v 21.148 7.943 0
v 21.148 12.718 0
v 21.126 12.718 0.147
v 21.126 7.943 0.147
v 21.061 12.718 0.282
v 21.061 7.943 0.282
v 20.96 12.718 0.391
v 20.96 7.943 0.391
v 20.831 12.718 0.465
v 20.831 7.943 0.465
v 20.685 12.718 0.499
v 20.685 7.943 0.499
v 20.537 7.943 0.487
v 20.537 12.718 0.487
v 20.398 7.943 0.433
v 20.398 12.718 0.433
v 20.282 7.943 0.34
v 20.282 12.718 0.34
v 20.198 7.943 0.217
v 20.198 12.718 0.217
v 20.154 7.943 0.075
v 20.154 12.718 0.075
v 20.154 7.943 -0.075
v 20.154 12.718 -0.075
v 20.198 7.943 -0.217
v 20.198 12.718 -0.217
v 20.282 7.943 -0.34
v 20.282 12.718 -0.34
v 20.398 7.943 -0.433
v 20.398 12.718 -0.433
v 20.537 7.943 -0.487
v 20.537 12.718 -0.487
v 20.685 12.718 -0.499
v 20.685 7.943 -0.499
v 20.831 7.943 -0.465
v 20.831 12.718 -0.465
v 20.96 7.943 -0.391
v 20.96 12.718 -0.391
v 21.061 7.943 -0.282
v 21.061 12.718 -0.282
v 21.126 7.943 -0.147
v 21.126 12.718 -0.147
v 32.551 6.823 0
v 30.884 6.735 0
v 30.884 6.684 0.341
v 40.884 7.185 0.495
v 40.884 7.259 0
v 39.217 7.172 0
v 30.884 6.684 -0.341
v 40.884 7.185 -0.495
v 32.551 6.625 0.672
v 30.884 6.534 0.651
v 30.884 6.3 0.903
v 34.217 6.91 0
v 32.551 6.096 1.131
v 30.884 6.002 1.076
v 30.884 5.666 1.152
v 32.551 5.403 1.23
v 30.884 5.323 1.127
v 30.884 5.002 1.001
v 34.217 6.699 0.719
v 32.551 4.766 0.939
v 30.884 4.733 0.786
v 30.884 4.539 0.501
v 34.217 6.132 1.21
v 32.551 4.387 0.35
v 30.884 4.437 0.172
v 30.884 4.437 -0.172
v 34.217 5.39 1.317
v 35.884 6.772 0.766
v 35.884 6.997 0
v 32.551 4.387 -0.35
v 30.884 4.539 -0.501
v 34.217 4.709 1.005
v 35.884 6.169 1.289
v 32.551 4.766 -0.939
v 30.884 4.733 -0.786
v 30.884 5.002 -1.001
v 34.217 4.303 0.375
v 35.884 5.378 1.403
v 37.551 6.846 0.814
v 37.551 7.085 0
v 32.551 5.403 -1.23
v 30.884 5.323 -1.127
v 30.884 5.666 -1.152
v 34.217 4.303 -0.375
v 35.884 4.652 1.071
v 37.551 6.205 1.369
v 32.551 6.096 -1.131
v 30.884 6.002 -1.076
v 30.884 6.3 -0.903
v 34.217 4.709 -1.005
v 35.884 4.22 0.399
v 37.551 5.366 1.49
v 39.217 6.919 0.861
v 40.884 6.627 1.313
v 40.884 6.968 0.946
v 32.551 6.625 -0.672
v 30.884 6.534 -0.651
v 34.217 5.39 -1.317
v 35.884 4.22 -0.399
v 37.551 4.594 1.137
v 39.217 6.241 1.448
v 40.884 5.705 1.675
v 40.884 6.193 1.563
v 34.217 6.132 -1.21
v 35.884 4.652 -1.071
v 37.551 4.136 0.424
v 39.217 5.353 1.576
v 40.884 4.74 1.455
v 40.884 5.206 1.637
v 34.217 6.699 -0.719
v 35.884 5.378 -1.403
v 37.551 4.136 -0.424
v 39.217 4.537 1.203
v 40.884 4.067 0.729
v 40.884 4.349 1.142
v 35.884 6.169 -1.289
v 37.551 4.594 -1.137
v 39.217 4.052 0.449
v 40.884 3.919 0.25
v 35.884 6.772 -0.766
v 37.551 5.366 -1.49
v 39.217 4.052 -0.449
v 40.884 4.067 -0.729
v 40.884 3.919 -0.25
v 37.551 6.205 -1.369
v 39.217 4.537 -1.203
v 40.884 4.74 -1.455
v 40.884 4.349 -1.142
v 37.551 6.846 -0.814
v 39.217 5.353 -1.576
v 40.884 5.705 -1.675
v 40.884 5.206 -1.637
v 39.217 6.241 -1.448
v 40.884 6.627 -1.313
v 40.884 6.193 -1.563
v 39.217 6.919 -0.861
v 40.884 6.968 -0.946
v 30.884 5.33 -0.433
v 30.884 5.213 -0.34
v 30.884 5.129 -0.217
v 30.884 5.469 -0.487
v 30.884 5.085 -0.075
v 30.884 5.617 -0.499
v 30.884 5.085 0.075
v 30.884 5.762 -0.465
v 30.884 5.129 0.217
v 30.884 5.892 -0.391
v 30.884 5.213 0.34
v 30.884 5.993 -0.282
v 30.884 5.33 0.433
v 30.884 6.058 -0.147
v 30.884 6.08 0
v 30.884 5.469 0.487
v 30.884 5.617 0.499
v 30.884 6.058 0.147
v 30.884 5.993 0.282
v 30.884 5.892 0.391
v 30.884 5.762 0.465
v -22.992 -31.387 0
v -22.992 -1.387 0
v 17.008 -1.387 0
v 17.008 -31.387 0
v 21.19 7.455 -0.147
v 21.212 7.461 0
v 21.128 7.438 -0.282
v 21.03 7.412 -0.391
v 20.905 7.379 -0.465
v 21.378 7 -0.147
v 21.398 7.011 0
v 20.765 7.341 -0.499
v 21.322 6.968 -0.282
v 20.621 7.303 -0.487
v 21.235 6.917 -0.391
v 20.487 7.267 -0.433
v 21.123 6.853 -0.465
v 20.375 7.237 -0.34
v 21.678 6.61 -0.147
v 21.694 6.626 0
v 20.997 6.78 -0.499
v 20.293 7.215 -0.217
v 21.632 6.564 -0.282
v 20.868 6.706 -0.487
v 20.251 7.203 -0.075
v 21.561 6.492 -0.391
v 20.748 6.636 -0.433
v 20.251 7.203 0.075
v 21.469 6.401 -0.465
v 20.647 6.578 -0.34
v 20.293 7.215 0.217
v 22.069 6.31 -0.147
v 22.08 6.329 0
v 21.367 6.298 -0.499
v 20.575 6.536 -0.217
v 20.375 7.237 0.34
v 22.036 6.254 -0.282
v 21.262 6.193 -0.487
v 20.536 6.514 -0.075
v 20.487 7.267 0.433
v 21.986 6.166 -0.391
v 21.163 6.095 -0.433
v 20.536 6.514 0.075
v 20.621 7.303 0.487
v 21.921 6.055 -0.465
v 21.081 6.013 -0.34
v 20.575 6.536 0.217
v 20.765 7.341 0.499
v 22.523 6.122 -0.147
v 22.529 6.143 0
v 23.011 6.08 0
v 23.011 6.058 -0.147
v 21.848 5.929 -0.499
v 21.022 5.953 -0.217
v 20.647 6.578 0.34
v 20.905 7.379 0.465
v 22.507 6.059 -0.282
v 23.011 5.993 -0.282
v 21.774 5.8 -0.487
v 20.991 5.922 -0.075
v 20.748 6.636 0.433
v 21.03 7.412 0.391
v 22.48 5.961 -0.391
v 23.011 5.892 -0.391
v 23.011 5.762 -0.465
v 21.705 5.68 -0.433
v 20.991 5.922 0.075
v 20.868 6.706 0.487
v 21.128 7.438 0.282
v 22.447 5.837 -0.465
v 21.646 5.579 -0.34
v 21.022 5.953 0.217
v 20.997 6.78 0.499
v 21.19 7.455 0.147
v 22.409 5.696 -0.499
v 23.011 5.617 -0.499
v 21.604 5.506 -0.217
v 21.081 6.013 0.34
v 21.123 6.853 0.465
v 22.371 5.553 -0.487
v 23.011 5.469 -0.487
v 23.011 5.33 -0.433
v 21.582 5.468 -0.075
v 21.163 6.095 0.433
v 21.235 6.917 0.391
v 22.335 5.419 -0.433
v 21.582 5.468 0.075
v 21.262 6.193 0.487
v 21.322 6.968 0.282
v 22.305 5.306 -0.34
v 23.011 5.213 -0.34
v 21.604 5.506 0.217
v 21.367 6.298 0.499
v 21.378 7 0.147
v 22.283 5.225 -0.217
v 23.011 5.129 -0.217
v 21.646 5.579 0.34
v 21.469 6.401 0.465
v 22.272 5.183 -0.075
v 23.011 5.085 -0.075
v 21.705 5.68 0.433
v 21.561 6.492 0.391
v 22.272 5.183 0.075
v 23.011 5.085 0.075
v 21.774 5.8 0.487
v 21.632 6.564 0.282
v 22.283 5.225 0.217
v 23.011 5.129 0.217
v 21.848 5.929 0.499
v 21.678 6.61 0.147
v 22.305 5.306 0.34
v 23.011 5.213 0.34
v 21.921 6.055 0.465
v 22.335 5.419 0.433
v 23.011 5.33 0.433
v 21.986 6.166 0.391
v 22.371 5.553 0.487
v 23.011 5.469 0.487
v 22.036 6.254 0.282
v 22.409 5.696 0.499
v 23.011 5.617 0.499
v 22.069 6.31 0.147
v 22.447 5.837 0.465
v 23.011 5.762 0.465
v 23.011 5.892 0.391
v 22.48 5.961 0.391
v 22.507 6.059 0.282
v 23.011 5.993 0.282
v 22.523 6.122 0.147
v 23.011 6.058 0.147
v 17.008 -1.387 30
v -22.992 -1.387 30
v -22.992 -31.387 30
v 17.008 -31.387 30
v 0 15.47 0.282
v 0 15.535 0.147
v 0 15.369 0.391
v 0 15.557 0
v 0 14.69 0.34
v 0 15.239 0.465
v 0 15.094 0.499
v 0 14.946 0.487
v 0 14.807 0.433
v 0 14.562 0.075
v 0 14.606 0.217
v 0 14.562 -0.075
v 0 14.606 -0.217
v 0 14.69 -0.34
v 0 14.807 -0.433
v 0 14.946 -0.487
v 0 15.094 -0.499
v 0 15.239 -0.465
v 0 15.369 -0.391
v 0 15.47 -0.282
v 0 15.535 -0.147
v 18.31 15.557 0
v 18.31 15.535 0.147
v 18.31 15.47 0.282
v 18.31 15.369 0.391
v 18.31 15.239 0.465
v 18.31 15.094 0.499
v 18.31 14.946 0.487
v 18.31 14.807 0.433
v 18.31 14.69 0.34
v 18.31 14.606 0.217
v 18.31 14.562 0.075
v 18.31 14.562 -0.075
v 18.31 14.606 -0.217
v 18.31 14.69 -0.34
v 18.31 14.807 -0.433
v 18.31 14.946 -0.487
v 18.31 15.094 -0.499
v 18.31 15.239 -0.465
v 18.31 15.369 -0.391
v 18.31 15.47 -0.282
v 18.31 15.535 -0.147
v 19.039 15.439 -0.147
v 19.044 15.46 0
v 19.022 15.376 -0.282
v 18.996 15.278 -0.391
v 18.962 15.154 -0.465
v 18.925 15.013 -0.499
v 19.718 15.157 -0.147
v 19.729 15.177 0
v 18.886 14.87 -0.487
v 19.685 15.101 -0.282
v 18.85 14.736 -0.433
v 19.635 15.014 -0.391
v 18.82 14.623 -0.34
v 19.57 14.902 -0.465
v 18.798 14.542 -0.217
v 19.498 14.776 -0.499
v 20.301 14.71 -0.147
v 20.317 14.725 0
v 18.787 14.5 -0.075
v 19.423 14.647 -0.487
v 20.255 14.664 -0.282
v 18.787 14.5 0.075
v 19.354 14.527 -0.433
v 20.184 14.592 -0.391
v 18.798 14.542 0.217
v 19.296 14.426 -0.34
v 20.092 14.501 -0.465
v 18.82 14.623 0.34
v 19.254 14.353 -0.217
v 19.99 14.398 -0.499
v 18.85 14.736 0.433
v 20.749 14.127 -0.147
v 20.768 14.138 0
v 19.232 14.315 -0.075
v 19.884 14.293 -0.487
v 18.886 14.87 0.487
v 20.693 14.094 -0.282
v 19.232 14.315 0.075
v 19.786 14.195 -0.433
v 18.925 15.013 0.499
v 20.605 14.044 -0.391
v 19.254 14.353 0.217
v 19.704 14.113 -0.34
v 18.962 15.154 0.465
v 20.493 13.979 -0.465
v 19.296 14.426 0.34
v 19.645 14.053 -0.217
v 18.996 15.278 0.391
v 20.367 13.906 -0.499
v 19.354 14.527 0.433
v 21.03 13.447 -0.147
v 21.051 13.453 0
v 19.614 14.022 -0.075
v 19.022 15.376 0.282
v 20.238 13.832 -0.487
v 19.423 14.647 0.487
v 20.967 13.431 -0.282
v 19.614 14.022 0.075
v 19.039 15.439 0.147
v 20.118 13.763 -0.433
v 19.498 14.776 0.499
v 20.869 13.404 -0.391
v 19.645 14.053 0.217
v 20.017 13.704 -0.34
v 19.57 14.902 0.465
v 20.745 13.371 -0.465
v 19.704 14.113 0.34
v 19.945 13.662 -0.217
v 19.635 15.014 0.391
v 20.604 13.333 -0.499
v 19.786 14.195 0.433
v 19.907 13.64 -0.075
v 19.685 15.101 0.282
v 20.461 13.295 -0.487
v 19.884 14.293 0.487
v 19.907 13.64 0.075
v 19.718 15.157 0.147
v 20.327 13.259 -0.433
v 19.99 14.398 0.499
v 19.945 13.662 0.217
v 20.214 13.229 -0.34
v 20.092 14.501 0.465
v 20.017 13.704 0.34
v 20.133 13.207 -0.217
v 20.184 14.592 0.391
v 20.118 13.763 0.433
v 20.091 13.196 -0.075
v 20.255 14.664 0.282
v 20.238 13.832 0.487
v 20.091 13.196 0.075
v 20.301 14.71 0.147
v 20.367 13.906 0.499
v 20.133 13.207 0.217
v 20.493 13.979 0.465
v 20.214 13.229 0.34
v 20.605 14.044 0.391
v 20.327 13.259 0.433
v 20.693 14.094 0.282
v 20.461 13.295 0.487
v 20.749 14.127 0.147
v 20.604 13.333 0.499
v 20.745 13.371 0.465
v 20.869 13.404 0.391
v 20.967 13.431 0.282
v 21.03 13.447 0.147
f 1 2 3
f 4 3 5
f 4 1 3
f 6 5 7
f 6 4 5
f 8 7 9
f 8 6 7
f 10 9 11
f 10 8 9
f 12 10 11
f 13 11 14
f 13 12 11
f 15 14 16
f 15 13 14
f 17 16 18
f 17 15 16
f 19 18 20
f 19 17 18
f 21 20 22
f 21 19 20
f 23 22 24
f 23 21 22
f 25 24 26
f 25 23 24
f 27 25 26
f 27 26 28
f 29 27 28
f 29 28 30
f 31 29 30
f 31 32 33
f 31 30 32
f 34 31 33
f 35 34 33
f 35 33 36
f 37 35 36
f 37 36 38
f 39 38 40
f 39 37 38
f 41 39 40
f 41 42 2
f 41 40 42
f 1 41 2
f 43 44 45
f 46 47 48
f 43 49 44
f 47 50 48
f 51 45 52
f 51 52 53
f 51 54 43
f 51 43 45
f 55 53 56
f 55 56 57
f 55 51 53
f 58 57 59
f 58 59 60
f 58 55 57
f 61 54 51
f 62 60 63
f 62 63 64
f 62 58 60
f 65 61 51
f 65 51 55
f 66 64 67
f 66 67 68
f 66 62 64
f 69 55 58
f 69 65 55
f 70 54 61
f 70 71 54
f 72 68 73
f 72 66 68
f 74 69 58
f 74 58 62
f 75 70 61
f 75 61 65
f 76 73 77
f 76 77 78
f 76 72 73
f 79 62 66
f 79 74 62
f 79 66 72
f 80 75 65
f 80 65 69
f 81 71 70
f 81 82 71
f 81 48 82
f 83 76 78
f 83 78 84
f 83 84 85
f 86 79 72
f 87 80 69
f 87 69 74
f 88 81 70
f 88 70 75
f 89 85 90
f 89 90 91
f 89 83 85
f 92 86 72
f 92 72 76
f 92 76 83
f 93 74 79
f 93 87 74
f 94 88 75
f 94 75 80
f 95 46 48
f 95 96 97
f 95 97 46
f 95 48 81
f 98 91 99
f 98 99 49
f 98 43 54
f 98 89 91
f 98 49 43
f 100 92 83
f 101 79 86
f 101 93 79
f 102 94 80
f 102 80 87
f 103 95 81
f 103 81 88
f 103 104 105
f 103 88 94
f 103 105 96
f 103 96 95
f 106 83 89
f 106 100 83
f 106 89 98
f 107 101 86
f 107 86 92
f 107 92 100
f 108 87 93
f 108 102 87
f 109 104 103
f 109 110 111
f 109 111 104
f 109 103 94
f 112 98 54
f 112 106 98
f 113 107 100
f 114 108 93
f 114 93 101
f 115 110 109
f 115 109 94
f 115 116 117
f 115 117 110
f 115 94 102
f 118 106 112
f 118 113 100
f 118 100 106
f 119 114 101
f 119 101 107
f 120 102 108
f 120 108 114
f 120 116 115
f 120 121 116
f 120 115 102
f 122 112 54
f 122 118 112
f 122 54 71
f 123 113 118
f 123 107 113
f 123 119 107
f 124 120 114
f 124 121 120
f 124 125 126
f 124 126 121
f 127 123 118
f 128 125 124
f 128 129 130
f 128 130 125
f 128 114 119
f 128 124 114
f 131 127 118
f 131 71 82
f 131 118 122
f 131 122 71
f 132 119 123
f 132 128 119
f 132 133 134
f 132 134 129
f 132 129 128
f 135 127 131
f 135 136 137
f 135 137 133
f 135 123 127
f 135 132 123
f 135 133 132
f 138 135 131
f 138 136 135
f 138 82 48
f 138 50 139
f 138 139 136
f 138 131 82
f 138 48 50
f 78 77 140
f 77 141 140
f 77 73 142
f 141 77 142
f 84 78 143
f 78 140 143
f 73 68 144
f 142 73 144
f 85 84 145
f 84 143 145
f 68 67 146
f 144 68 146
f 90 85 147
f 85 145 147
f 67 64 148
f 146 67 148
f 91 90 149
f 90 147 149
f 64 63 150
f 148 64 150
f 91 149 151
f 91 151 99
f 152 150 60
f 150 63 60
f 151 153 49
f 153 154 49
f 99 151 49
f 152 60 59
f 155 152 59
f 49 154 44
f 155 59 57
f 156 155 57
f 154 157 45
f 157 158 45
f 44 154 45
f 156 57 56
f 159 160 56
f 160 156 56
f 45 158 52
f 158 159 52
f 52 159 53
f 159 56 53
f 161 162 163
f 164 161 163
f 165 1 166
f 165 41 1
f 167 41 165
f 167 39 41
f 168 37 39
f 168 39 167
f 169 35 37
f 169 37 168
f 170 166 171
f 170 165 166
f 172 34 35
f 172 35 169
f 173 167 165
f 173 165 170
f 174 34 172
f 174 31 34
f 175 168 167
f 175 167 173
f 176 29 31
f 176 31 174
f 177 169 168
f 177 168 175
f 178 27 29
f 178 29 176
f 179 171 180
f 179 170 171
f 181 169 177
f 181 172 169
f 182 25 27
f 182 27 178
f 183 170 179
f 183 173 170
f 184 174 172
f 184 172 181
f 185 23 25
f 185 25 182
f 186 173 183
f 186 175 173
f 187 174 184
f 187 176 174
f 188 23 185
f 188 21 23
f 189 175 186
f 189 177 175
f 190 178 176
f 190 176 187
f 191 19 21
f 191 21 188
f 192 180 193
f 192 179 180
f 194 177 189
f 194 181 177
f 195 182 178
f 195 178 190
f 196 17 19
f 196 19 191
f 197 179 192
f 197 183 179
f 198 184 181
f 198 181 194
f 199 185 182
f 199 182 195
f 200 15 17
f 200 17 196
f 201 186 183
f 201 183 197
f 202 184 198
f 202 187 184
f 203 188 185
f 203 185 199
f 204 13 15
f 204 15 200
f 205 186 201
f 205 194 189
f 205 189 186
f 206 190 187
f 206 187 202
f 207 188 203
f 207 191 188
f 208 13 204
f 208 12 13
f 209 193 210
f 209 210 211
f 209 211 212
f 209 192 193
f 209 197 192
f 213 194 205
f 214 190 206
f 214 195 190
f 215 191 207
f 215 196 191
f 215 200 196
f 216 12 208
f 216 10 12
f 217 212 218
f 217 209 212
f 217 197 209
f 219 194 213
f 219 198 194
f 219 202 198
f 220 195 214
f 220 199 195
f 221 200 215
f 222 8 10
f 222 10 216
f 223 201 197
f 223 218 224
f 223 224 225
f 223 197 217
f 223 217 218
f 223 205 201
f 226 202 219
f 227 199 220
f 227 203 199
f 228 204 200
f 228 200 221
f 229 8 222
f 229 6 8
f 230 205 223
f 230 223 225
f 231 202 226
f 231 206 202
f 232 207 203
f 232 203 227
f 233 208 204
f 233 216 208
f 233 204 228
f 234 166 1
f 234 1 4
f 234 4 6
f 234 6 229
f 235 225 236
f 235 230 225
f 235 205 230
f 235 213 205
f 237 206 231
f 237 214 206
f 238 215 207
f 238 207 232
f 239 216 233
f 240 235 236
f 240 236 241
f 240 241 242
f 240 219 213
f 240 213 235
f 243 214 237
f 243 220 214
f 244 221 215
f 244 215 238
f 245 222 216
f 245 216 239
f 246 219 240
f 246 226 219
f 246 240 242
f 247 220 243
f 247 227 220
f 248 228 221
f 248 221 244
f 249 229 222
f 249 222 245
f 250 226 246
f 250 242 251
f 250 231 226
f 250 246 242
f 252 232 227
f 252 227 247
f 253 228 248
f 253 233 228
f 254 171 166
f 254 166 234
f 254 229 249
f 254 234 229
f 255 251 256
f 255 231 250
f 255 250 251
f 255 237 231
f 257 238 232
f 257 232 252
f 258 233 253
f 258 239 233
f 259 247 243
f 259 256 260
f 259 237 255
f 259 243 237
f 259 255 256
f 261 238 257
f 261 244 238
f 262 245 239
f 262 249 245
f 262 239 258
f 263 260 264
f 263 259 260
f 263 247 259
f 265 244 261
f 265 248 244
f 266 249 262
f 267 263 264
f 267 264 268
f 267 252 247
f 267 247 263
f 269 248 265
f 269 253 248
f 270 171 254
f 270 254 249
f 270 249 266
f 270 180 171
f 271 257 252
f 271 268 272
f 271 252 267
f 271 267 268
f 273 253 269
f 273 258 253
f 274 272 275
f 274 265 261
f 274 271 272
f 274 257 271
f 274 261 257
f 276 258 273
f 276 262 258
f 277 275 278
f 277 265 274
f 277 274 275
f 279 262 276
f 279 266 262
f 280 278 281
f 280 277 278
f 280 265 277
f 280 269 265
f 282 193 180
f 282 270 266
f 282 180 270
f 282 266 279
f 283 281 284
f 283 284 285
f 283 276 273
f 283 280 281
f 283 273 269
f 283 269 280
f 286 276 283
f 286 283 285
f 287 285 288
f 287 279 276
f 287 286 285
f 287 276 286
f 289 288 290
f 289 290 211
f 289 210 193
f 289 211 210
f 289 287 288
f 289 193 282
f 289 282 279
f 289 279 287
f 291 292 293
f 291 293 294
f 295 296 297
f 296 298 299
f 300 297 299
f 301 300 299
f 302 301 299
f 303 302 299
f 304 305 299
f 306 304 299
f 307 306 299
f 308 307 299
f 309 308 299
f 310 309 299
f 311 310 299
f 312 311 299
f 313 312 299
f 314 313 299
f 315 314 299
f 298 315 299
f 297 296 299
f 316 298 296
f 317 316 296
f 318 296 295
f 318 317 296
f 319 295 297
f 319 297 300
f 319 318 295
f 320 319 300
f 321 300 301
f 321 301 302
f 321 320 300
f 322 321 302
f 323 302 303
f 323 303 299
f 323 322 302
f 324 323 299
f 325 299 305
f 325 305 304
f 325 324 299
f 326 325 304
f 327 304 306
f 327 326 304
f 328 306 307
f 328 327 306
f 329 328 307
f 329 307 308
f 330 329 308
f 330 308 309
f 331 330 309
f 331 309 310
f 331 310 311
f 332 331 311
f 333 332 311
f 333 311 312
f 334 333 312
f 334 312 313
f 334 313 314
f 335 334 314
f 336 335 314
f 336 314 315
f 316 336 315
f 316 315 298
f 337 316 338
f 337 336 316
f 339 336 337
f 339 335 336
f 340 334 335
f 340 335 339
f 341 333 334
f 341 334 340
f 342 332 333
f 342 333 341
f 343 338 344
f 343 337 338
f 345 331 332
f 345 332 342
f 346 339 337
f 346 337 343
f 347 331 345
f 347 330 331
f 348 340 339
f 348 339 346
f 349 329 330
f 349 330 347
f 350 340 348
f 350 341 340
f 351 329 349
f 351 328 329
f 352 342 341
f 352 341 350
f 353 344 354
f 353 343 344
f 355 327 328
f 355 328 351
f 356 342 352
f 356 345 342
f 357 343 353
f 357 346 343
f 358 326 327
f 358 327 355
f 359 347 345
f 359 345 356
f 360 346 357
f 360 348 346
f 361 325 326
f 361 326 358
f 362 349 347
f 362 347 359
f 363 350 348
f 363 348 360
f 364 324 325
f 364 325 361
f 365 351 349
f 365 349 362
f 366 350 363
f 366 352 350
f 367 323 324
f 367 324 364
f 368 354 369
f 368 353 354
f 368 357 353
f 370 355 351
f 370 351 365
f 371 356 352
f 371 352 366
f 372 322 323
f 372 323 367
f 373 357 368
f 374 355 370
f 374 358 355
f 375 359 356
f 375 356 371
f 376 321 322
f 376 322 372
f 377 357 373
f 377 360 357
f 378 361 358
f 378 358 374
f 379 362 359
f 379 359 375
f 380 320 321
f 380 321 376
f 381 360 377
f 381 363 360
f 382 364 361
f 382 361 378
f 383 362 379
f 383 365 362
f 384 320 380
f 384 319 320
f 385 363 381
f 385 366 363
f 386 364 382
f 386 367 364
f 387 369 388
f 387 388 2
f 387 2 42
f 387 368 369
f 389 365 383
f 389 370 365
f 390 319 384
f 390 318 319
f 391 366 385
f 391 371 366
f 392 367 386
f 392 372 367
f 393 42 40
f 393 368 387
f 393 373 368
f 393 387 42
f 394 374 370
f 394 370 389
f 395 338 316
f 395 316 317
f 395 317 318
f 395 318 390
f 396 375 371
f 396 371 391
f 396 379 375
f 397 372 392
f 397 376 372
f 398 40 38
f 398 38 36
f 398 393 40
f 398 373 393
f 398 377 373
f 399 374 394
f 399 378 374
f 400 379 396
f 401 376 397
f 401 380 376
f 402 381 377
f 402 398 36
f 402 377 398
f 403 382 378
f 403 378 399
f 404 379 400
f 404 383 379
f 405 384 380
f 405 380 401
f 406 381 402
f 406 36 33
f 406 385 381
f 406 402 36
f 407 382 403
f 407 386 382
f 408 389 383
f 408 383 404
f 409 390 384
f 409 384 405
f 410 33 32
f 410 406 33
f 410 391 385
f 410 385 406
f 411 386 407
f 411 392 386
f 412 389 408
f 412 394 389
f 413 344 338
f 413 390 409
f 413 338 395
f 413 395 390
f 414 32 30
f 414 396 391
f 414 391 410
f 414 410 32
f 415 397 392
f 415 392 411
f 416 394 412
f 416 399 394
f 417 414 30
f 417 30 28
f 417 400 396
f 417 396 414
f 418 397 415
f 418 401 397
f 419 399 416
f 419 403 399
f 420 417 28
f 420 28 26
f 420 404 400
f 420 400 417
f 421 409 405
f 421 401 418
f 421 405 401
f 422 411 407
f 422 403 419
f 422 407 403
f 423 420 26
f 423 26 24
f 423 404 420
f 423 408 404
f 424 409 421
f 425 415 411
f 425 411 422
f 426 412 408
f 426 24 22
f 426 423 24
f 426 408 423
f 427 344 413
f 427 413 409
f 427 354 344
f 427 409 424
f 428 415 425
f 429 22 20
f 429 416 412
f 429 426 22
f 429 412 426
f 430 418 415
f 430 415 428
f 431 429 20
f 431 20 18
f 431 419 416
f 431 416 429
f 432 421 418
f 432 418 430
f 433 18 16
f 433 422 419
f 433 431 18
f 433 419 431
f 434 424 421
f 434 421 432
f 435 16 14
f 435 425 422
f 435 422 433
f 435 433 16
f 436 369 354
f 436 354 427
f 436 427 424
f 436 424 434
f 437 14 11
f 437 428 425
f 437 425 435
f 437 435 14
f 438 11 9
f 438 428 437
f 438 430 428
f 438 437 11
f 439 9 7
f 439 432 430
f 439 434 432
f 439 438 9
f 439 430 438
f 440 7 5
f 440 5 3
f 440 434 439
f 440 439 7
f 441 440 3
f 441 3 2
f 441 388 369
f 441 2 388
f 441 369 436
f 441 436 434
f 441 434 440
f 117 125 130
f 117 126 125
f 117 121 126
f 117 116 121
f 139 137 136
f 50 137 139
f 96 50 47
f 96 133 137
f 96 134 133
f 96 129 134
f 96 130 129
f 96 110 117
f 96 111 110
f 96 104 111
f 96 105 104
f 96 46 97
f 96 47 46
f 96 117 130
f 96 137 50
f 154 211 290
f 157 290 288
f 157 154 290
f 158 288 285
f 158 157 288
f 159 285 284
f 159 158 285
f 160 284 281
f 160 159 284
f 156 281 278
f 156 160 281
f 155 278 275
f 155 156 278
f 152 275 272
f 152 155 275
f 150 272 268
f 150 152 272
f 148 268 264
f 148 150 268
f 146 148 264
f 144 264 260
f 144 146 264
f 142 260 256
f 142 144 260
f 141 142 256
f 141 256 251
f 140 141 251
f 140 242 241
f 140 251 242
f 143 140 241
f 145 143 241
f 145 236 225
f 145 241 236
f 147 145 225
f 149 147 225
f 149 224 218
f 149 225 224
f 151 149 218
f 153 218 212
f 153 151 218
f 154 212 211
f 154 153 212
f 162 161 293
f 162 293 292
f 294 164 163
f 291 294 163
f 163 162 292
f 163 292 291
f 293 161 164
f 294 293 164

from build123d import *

# Parameters (mm, degrees)
F0_W     = 40
F0_H     = 30
F1_DEPTH = 30
F3_R     = 0.5
F5_R     = 1.1554903768
F6_DEPTH = 10
F6_TAPER = -3


with BuildPart() as f1:
    # F0 (on Top) → F1 (new body)
    with BuildSketch(Plane.XY):
        with Locations((-2.9915943742, -16.3873385004)):
            Rectangle(F0_W, F0_H)
    extrude(amount=F1_DEPTH)


with BuildPart() as f4:
    # F4: sweep along a path in F2
    with BuildLine(Plane.XY) as f4_path:
        Line((0, 15.0568103418), (18.3096965775, 15.0568103418))
        ThreePointArc((18.3096965775, 15.0568103418), (19.9631523474, 14.3719265371), (20.6480361521, 12.7184707671))
        Line((20.6480361521, 12.7184707671), (20.6480361521, 7.9430229962))
        ThreePointArc((20.6480361521, 7.9430229962), (21.3402119965, 6.2719626852), (23.0112723075, 5.5797868408))
        Line((23.0112723075, 5.5797868408), (30.8839306235, 5.5797868408))
    # F3 (on Right) → F4 (sweep)
    with BuildSketch(Plane.YZ):
        with Locations((15.0568103418, 0)):
            Circle(F3_R)
    sweep(path=f4_path.line)

    # F5 (on face) → F6 (join)
    with BuildSketch(Plane.YZ.offset(30.8839306235)):
        with Locations((5.5797868408, 0)):
            Circle(F5_R)
    extrude(amount=F6_DEPTH, taper=F6_TAPER)


solid = Compound([f1.part, f4.part])
